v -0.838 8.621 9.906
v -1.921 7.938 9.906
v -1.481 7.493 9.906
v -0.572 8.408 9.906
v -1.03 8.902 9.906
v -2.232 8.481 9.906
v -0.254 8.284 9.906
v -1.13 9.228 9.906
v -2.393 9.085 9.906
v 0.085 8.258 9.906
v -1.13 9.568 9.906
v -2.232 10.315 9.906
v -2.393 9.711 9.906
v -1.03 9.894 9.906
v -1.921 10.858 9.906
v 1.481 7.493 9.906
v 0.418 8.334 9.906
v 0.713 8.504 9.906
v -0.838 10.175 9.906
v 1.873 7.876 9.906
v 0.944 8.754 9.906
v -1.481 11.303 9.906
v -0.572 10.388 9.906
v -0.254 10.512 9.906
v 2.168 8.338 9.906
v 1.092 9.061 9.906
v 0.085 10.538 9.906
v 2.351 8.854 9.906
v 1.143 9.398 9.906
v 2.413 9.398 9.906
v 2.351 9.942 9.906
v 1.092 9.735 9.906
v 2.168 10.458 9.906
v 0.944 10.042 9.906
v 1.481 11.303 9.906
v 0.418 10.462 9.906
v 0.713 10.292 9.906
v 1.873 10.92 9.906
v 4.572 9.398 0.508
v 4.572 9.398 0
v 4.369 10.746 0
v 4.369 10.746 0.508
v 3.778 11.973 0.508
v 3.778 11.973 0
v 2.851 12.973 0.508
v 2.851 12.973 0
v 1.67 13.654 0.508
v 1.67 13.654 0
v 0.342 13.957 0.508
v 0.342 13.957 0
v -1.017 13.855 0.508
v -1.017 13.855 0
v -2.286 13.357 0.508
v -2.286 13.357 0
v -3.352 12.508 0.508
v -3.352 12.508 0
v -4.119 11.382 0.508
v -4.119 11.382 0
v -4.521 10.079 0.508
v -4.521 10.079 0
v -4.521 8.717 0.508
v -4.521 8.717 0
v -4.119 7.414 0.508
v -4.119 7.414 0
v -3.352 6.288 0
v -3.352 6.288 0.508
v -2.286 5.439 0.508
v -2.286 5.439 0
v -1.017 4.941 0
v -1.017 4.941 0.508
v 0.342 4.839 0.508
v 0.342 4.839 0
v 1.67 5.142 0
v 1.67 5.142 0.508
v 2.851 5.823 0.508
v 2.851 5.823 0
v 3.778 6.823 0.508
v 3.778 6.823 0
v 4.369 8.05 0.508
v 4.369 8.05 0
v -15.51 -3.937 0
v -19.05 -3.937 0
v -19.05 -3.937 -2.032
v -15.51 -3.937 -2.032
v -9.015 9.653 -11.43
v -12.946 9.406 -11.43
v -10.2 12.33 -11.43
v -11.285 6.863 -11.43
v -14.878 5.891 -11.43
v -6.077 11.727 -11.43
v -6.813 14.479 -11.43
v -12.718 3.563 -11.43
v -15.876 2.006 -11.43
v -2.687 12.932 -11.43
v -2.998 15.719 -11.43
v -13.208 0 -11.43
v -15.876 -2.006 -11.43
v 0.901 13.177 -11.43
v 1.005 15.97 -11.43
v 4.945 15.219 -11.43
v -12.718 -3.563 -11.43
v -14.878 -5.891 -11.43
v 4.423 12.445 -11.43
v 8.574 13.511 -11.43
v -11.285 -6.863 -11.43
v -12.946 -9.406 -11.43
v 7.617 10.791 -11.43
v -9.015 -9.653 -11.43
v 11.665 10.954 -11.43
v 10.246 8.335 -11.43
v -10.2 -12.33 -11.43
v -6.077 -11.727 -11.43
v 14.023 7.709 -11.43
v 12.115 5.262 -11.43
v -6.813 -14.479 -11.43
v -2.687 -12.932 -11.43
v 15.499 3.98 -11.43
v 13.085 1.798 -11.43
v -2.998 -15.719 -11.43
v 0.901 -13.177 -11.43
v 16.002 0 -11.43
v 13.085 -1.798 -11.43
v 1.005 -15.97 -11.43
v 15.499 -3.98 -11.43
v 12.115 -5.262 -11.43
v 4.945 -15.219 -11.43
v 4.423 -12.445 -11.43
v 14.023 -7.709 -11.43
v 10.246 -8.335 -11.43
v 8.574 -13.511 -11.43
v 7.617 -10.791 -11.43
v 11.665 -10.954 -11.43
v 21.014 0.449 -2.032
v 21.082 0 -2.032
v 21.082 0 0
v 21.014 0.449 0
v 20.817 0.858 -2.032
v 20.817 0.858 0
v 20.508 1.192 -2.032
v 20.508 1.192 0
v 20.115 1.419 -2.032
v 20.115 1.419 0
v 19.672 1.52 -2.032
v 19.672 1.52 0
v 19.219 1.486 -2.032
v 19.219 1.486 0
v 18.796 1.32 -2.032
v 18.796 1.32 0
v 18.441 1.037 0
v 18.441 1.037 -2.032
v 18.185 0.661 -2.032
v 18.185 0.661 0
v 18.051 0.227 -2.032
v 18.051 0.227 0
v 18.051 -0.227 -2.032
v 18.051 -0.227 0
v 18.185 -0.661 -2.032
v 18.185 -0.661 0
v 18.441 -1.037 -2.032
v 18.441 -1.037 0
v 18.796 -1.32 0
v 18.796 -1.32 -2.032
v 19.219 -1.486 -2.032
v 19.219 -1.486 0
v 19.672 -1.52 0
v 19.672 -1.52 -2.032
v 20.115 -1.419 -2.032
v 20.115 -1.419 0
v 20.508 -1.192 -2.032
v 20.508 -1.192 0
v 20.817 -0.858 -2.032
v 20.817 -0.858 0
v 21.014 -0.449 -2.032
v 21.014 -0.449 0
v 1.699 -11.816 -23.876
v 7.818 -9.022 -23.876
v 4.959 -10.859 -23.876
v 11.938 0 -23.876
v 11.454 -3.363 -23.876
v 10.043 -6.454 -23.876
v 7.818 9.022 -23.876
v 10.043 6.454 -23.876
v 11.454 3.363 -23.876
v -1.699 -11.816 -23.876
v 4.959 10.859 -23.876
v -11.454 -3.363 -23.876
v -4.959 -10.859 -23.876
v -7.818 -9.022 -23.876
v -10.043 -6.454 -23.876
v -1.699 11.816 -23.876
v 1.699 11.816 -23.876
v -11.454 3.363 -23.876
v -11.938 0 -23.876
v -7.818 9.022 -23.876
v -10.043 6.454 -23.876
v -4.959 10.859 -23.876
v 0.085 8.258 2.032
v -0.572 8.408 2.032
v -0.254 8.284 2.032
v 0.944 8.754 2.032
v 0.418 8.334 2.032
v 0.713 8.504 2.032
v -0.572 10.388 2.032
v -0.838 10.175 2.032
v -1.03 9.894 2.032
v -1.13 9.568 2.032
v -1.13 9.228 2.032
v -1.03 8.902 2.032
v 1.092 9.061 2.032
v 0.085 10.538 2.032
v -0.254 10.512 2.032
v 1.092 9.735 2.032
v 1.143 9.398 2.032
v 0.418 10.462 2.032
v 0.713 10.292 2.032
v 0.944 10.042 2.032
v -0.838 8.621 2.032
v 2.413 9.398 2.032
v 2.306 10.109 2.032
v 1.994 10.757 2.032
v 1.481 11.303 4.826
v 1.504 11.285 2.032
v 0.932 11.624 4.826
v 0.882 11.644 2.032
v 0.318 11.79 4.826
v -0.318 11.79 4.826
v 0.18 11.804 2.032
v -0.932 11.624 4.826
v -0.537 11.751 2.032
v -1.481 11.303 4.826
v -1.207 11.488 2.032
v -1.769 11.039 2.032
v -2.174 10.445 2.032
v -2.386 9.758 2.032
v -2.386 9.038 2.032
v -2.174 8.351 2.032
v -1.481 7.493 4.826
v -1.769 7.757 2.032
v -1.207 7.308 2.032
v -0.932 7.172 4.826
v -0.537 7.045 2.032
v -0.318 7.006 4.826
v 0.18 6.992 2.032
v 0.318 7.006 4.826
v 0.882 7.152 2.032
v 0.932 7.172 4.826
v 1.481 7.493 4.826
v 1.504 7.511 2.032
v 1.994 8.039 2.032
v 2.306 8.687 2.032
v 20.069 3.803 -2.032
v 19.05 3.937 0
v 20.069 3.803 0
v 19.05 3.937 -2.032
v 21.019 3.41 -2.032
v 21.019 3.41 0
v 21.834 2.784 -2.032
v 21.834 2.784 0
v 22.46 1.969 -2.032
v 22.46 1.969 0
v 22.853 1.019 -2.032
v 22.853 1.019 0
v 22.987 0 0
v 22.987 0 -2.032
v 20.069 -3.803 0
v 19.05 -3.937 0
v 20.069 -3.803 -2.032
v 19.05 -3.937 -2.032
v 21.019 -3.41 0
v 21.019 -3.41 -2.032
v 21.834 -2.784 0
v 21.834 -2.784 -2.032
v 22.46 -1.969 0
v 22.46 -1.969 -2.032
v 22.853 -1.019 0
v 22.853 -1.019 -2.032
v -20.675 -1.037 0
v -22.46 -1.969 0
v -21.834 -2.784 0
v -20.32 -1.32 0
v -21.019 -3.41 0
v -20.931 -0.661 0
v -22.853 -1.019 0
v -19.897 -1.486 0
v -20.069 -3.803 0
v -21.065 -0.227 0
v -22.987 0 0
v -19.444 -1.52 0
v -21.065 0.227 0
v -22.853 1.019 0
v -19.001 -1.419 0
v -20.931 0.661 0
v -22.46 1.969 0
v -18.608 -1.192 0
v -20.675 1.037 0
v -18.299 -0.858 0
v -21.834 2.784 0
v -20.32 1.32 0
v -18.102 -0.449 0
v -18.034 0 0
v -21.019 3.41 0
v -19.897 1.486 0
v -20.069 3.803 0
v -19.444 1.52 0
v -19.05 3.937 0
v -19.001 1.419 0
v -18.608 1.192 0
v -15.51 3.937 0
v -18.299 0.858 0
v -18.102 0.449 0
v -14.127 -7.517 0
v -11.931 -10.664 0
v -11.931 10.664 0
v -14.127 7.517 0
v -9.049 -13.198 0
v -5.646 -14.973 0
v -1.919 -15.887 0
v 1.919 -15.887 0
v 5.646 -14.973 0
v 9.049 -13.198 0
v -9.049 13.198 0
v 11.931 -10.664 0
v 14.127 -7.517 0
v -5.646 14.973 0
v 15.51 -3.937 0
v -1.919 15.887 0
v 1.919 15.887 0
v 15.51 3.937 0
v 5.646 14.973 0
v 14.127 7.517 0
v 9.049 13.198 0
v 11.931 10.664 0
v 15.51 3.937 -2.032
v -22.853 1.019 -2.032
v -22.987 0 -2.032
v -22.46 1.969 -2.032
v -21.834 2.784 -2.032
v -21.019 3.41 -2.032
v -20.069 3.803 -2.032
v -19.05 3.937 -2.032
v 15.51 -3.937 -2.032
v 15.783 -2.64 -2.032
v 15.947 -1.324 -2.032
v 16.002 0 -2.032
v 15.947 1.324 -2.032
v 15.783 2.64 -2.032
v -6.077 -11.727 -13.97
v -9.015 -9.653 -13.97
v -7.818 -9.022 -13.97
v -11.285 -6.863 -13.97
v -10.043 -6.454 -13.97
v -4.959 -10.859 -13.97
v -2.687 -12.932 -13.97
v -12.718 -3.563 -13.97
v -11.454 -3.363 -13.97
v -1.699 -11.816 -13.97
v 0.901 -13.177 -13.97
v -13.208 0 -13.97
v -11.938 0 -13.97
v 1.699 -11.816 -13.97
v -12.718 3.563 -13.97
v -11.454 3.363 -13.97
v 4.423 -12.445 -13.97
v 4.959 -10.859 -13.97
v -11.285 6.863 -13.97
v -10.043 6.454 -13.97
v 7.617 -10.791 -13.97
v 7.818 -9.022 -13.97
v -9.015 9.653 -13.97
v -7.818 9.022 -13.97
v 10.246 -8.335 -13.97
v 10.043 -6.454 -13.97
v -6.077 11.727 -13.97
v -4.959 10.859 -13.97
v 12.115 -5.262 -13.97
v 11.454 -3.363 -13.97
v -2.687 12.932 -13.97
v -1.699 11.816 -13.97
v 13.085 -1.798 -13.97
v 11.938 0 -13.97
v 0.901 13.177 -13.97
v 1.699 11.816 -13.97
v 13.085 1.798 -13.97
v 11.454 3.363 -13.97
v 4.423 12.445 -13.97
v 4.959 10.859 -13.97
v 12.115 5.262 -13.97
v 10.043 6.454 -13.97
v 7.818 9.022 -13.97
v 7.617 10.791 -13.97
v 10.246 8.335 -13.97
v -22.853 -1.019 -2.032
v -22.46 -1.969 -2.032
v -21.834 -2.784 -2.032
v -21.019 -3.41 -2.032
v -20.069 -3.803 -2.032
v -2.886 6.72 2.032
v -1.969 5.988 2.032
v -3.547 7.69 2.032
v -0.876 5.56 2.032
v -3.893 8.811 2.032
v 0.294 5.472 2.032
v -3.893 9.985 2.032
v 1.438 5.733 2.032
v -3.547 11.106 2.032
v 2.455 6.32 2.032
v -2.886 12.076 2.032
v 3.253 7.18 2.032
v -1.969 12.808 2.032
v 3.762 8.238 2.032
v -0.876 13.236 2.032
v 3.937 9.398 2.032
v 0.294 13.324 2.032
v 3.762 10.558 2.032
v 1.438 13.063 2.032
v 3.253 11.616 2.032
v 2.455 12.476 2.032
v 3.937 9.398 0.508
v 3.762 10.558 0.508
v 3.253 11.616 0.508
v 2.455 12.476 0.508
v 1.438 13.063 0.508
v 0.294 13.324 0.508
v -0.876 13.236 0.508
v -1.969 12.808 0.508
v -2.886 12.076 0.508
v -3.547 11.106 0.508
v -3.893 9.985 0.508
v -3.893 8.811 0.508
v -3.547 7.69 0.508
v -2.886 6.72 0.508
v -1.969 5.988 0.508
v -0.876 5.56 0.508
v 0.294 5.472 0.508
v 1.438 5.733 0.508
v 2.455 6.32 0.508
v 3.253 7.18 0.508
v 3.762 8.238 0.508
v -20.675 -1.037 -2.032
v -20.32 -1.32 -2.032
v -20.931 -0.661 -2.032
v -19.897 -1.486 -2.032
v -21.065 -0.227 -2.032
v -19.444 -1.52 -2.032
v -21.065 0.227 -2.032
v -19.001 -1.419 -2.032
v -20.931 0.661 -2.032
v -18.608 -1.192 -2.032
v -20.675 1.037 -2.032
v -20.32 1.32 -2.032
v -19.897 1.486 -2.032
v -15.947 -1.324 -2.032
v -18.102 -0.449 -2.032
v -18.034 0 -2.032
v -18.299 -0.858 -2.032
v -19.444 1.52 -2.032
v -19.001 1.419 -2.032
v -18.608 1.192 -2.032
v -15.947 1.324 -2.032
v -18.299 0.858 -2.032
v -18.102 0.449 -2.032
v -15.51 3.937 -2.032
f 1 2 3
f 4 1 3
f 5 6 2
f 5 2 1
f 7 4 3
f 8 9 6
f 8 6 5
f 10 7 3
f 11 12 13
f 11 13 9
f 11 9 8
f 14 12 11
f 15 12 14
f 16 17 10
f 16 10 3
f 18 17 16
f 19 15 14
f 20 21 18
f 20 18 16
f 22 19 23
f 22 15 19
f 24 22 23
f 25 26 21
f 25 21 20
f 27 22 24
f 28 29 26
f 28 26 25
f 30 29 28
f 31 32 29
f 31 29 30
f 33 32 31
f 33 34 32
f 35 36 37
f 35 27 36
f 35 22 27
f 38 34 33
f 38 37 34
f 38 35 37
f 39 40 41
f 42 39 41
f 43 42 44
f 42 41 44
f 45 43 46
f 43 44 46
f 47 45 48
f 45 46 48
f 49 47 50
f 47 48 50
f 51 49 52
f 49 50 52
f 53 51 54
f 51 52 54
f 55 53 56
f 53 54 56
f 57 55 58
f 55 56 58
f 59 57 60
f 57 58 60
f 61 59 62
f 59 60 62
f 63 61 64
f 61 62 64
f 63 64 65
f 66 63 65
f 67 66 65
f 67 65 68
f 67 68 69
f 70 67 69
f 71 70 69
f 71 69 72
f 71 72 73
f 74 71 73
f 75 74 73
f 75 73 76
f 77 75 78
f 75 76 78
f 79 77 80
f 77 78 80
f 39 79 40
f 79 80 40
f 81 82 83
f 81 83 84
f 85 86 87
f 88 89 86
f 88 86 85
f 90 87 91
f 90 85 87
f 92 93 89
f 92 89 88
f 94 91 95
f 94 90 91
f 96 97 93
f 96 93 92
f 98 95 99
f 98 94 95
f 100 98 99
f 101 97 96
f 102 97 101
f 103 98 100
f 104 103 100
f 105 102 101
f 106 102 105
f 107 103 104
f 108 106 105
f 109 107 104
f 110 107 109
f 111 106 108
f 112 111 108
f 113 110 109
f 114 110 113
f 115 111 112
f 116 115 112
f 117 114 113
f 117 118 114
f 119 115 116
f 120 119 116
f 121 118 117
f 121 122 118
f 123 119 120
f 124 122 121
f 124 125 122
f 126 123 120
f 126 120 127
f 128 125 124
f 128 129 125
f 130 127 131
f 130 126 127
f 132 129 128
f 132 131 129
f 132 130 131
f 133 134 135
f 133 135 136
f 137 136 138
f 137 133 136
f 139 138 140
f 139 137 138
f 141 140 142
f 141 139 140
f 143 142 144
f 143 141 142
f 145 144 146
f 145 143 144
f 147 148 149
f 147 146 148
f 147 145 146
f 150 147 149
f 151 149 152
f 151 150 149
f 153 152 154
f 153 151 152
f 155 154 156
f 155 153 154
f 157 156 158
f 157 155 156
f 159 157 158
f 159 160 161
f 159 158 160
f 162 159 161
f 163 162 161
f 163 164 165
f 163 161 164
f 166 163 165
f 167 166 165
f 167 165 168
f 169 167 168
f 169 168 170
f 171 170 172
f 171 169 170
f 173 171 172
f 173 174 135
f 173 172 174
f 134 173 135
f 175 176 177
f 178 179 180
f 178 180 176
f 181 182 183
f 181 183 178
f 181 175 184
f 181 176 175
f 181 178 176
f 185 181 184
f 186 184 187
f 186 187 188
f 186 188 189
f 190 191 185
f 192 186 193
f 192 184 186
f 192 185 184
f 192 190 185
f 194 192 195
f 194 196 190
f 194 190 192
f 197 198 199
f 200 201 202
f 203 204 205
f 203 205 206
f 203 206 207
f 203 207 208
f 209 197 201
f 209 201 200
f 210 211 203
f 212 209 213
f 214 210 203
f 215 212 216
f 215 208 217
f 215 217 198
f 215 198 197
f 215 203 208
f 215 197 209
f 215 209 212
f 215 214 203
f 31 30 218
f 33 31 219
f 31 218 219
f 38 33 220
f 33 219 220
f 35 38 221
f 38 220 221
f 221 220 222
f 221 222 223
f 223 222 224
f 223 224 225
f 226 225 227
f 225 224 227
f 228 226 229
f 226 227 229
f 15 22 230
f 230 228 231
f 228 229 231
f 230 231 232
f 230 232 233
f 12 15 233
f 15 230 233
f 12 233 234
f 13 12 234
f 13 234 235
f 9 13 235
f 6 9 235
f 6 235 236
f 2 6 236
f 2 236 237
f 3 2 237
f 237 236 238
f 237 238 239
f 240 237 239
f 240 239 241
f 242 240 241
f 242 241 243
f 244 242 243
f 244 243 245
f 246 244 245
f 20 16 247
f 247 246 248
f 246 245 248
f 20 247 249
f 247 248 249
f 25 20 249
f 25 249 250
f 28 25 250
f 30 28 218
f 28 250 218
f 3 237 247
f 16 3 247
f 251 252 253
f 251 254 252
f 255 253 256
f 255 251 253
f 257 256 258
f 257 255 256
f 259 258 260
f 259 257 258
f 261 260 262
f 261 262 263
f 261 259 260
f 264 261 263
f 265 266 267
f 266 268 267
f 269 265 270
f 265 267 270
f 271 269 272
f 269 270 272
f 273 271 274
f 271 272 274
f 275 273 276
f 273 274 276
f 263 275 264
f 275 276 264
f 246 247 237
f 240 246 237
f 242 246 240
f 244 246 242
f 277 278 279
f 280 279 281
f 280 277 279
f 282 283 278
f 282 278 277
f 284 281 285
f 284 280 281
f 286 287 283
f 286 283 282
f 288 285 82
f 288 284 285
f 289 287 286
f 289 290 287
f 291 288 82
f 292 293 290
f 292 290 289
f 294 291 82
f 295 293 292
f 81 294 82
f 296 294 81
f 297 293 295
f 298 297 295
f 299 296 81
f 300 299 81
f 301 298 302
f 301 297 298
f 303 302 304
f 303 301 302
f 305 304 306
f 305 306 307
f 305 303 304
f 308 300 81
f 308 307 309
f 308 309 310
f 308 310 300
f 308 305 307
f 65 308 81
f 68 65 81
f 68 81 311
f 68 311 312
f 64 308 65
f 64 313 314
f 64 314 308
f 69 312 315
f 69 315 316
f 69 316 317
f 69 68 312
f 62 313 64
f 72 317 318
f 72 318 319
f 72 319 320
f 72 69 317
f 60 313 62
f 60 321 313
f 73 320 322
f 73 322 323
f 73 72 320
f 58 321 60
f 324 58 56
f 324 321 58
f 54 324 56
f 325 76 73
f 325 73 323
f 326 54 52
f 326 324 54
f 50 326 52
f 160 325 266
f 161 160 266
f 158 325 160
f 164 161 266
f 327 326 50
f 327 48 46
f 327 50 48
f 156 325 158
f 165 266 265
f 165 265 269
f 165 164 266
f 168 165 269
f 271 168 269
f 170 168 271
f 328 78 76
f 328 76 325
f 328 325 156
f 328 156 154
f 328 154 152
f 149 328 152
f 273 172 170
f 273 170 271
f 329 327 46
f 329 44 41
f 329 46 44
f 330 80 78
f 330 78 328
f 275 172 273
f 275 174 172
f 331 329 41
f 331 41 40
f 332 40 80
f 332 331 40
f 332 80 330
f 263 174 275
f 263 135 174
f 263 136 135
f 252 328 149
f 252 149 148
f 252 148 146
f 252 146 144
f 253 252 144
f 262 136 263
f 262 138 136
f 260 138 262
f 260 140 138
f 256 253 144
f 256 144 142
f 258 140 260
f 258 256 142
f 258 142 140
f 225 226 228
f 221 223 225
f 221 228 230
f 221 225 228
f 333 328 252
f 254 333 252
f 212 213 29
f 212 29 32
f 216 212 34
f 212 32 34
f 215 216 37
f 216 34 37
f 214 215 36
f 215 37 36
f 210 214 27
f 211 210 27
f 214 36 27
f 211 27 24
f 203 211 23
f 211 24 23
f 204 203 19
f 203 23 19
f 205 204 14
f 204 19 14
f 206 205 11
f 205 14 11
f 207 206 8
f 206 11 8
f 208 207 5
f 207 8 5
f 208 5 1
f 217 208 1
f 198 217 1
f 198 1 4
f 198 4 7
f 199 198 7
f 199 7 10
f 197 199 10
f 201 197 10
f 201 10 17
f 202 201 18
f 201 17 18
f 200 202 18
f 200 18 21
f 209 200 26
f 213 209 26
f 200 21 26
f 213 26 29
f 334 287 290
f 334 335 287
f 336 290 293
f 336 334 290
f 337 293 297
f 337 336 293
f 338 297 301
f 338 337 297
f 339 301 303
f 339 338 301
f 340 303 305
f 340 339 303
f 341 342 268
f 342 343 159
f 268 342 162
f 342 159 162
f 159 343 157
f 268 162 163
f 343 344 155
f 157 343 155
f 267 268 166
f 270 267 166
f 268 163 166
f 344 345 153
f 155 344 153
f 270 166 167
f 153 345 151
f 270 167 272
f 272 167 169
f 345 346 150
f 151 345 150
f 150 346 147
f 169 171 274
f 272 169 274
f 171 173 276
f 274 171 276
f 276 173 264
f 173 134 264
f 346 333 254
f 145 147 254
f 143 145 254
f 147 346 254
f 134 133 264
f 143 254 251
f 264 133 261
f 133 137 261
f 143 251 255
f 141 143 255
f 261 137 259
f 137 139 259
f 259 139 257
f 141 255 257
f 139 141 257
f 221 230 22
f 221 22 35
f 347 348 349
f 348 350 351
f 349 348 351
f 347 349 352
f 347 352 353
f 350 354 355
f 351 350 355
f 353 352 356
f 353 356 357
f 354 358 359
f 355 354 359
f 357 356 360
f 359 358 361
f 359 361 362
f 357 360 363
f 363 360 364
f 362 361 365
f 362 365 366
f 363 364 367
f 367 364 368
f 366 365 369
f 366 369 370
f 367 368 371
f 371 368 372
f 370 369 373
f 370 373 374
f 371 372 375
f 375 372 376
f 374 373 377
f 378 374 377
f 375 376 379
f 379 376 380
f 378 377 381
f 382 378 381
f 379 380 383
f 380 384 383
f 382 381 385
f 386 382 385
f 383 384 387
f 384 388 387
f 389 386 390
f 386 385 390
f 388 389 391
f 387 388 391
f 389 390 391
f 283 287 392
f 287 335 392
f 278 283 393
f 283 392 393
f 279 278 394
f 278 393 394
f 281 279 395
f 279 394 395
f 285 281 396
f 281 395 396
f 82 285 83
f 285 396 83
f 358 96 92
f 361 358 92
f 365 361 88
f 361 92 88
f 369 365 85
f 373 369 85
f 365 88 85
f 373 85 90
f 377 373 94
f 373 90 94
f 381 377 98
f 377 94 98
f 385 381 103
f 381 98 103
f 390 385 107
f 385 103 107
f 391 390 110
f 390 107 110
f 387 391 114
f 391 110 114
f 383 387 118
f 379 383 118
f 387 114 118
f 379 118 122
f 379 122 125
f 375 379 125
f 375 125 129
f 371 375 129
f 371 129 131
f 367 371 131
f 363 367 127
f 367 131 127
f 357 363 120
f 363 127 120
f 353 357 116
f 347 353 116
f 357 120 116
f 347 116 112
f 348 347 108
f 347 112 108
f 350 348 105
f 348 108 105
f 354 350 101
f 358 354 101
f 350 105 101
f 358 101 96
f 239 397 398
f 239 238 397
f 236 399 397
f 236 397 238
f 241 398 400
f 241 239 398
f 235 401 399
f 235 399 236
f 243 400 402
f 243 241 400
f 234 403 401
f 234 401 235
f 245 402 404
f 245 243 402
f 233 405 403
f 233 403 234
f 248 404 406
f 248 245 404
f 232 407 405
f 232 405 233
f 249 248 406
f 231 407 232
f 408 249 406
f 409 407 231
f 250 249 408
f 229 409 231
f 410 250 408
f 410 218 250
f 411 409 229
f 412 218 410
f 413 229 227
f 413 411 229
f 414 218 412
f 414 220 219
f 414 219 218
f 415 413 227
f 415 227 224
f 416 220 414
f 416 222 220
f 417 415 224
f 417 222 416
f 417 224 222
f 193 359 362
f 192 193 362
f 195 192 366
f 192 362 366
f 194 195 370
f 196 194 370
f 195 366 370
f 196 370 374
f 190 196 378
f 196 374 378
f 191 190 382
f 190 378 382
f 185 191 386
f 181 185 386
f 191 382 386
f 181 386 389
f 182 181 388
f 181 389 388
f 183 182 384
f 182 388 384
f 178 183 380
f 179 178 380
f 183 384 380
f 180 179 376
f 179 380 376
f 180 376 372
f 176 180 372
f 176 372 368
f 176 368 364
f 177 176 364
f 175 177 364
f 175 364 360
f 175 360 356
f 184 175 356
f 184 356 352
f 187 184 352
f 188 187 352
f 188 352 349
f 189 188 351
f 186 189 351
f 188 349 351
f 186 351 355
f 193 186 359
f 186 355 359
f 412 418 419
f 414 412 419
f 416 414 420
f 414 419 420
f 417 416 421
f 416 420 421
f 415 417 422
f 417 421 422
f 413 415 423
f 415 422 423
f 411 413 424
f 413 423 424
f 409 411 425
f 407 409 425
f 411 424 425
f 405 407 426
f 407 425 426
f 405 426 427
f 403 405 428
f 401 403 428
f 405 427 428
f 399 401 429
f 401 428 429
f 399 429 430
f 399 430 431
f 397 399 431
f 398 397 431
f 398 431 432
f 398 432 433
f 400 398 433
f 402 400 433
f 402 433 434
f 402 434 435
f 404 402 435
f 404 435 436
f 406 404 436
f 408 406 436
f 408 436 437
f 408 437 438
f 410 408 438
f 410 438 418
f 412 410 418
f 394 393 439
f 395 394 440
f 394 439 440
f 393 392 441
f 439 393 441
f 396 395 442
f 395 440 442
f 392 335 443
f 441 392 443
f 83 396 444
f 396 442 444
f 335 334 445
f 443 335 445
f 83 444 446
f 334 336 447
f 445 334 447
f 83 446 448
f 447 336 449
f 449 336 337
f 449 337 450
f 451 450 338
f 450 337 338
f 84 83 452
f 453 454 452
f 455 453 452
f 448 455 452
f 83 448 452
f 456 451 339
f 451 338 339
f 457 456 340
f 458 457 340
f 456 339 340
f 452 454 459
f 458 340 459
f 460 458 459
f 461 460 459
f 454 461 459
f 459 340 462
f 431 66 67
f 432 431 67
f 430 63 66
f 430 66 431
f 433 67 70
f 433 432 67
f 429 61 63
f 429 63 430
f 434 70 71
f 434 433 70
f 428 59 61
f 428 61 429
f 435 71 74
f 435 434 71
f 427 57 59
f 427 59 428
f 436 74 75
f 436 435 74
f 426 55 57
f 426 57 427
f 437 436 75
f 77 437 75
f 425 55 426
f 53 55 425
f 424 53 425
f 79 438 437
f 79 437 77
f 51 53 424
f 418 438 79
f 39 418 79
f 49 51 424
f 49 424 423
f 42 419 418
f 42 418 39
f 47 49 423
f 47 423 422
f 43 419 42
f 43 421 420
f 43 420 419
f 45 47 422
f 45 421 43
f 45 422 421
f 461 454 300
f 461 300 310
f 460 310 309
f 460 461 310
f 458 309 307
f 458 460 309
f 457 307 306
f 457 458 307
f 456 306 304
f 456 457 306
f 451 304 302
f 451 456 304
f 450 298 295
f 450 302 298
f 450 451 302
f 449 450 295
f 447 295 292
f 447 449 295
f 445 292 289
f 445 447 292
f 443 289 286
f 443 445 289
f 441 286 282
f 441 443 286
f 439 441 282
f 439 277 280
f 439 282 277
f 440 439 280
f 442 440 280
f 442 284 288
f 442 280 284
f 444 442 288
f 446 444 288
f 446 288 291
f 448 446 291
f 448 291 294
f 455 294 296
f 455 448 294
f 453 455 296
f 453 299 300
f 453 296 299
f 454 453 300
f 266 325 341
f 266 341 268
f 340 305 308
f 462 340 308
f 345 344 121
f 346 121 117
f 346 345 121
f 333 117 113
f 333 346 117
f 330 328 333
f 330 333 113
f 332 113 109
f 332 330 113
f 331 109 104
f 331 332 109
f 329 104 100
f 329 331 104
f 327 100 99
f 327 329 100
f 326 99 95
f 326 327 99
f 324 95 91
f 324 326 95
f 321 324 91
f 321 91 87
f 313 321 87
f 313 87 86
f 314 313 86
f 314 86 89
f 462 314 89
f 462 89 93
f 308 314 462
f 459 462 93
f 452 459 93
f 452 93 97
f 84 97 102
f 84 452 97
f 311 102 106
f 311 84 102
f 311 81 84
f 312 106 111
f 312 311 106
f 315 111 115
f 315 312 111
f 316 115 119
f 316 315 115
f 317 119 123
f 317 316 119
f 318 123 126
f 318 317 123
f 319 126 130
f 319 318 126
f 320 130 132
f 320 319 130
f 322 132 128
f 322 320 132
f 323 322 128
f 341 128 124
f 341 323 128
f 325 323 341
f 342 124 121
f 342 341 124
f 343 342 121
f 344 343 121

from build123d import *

# Parameters (mm, degrees)
SKETCH1_R               = 16.002
BOSS_EXTRUDE1_DEPTH     = 13.97
SKETCH2_R               = 11.938
BOSS_EXTRUDE2_DEPTH     = 9.906
CUT_EXTRUDE1_START      = -2.54
SKETCH3_R               = 16.002
SKETCH3_R_2             = 13.208
CUT_EXTRUDE1_DEPTH      = 2.54
SKETCH4_W               = 45.974
SKETCH4_H               = 7.874
BOSS_EXTRUDE3_DEPTH     = 2.032
CUT_EXTRUDE2_DEPTH      = 37.803933879
CUT_EXTRUDE2_DEPTH_BACK = 37.803933879
SKETCH5_R               = 1.524
FILLET1_R               = 3.937
SKETCH6_R               = 4.572
BOSS_EXTRUDE4_DEPTH     = 0.508
SKETCH7_R               = 3.937
BOSS_EXTRUDE5_DEPTH     = 2.032
SKETCH8_R               = 2.413
BOSS_EXTRUDE6_DEPTH     = 9.906
CUT_EXTRUDE3_DEPTH      = 44.88268106
CUT_EXTRUDE3_DEPTH_BACK = 5.08
SKETCH10_R              = 1.143
CUT_EXTRUDE4_DEPTH      = 7.874


with BuildPart() as part:
    # Sketch1 → Boss-Extrude1 (new body)
    with BuildSketch(Plane.XY):
        Circle(SKETCH1_R)
    extrude(amount=-BOSS_EXTRUDE1_DEPTH)

    # Sketch2 → Boss-Extrude2 (add)
    with BuildSketch(Plane(origin=(0, 0, -13.97), x_dir=(-1, 0, 0), z_dir=(0, 0, -1))):
        Circle(SKETCH2_R)
    extrude(amount=BOSS_EXTRUDE2_DEPTH)

    # Sketch3 → Cut-Extrude1 (cut)
    with BuildSketch(Plane(origin=(0, 0, -13.97), x_dir=(-1, 0, 0), z_dir=(0, 0, -1)).offset(CUT_EXTRUDE1_START)):
        with Locations(Location((0, 0, 0), (0, 0, 180))):
            Circle(SKETCH3_R)
        Circle(SKETCH3_R_2, mode=Mode.SUBTRACT)
    extrude(amount=CUT_EXTRUDE1_DEPTH, mode=Mode.SUBTRACT)

    # Sketch4 → Boss-Extrude3 (add)
    with BuildSketch(Plane.XY):
        Rectangle(SKETCH4_W, SKETCH4_H)
    extrude(amount=-BOSS_EXTRUDE3_DEPTH)

    # Sketch5 → Cut-Extrude2 (cut, two sides: drawn at the far end of the back side and taken through both)
    with BuildSketch(Plane.XY.offset(-CUT_EXTRUDE2_DEPTH_BACK)):
        with Locations((-19.558, 0)):
            Circle(SKETCH5_R)
        with Locations((19.558, 0)):
            Circle(SKETCH5_R)
    extrude(amount=CUT_EXTRUDE2_DEPTH + CUT_EXTRUDE2_DEPTH_BACK, mode=Mode.SUBTRACT)

    # Fillet1
    fillet1_edges = [part.edges().sort_by_distance(p)[0] for p in [
        (22.987, 3.937, -1.016),
        (22.987, -3.937, -1.016),
        (-22.987, -3.937, -1.016),
        (-22.987, 3.937, -1.016),
    ]]
    fillet(fillet1_edges, radius=FILLET1_R - 0.0001)  # a hair under: the kernel refuses the full size

    # Sketch6 → Boss-Extrude4 (add)
    with BuildSketch(Plane.XY):
        with Locations((0, 9.398)):
            Circle(SKETCH6_R)
    extrude(amount=BOSS_EXTRUDE4_DEPTH)

    # Sketch7 → Boss-Extrude5 (add)
    with BuildSketch(Plane.XY):
        with Locations((0, 9.398)):
            Circle(SKETCH7_R)
    extrude(amount=BOSS_EXTRUDE5_DEPTH)

    # Sketch8 → Boss-Extrude6 (add)
    with BuildSketch(Plane.XY):
        with Locations((0, 9.398)):
            Circle(SKETCH8_R)
    extrude(amount=BOSS_EXTRUDE6_DEPTH)

    # Sketch9 → Cut-Extrude3 (cut, two sides: drawn at the far end of the back side and taken through both)
    with BuildSketch(Plane.XY.offset(9.906).offset(-CUT_EXTRUDE3_DEPTH_BACK)):
        with BuildLine():
            Line((-1.481061781, 11.303), (1.481061781, 11.303))
            ThreePointArc((1.481061781, 11.303), (0, 11.811), (-1.481061781, 11.303))
        make_face()
        with BuildLine():
            Line((-1.481061781, 7.493), (1.481061781, 7.493))
            ThreePointArc((1.481061781, 7.493), (0, 6.985), (-1.481061781, 7.493))
        make_face()
    extrude(amount=CUT_EXTRUDE3_DEPTH + CUT_EXTRUDE3_DEPTH_BACK, mode=Mode.SUBTRACT)

    # Sketch10 → Cut-Extrude4 (cut)
    with BuildSketch(Plane.XY.offset(9.906)):
        with Locations((0, 9.398)):
            Circle(SKETCH10_R)
    extrude(amount=-CUT_EXTRUDE4_DEPTH, mode=Mode.SUBTRACT)


solid = part.part
